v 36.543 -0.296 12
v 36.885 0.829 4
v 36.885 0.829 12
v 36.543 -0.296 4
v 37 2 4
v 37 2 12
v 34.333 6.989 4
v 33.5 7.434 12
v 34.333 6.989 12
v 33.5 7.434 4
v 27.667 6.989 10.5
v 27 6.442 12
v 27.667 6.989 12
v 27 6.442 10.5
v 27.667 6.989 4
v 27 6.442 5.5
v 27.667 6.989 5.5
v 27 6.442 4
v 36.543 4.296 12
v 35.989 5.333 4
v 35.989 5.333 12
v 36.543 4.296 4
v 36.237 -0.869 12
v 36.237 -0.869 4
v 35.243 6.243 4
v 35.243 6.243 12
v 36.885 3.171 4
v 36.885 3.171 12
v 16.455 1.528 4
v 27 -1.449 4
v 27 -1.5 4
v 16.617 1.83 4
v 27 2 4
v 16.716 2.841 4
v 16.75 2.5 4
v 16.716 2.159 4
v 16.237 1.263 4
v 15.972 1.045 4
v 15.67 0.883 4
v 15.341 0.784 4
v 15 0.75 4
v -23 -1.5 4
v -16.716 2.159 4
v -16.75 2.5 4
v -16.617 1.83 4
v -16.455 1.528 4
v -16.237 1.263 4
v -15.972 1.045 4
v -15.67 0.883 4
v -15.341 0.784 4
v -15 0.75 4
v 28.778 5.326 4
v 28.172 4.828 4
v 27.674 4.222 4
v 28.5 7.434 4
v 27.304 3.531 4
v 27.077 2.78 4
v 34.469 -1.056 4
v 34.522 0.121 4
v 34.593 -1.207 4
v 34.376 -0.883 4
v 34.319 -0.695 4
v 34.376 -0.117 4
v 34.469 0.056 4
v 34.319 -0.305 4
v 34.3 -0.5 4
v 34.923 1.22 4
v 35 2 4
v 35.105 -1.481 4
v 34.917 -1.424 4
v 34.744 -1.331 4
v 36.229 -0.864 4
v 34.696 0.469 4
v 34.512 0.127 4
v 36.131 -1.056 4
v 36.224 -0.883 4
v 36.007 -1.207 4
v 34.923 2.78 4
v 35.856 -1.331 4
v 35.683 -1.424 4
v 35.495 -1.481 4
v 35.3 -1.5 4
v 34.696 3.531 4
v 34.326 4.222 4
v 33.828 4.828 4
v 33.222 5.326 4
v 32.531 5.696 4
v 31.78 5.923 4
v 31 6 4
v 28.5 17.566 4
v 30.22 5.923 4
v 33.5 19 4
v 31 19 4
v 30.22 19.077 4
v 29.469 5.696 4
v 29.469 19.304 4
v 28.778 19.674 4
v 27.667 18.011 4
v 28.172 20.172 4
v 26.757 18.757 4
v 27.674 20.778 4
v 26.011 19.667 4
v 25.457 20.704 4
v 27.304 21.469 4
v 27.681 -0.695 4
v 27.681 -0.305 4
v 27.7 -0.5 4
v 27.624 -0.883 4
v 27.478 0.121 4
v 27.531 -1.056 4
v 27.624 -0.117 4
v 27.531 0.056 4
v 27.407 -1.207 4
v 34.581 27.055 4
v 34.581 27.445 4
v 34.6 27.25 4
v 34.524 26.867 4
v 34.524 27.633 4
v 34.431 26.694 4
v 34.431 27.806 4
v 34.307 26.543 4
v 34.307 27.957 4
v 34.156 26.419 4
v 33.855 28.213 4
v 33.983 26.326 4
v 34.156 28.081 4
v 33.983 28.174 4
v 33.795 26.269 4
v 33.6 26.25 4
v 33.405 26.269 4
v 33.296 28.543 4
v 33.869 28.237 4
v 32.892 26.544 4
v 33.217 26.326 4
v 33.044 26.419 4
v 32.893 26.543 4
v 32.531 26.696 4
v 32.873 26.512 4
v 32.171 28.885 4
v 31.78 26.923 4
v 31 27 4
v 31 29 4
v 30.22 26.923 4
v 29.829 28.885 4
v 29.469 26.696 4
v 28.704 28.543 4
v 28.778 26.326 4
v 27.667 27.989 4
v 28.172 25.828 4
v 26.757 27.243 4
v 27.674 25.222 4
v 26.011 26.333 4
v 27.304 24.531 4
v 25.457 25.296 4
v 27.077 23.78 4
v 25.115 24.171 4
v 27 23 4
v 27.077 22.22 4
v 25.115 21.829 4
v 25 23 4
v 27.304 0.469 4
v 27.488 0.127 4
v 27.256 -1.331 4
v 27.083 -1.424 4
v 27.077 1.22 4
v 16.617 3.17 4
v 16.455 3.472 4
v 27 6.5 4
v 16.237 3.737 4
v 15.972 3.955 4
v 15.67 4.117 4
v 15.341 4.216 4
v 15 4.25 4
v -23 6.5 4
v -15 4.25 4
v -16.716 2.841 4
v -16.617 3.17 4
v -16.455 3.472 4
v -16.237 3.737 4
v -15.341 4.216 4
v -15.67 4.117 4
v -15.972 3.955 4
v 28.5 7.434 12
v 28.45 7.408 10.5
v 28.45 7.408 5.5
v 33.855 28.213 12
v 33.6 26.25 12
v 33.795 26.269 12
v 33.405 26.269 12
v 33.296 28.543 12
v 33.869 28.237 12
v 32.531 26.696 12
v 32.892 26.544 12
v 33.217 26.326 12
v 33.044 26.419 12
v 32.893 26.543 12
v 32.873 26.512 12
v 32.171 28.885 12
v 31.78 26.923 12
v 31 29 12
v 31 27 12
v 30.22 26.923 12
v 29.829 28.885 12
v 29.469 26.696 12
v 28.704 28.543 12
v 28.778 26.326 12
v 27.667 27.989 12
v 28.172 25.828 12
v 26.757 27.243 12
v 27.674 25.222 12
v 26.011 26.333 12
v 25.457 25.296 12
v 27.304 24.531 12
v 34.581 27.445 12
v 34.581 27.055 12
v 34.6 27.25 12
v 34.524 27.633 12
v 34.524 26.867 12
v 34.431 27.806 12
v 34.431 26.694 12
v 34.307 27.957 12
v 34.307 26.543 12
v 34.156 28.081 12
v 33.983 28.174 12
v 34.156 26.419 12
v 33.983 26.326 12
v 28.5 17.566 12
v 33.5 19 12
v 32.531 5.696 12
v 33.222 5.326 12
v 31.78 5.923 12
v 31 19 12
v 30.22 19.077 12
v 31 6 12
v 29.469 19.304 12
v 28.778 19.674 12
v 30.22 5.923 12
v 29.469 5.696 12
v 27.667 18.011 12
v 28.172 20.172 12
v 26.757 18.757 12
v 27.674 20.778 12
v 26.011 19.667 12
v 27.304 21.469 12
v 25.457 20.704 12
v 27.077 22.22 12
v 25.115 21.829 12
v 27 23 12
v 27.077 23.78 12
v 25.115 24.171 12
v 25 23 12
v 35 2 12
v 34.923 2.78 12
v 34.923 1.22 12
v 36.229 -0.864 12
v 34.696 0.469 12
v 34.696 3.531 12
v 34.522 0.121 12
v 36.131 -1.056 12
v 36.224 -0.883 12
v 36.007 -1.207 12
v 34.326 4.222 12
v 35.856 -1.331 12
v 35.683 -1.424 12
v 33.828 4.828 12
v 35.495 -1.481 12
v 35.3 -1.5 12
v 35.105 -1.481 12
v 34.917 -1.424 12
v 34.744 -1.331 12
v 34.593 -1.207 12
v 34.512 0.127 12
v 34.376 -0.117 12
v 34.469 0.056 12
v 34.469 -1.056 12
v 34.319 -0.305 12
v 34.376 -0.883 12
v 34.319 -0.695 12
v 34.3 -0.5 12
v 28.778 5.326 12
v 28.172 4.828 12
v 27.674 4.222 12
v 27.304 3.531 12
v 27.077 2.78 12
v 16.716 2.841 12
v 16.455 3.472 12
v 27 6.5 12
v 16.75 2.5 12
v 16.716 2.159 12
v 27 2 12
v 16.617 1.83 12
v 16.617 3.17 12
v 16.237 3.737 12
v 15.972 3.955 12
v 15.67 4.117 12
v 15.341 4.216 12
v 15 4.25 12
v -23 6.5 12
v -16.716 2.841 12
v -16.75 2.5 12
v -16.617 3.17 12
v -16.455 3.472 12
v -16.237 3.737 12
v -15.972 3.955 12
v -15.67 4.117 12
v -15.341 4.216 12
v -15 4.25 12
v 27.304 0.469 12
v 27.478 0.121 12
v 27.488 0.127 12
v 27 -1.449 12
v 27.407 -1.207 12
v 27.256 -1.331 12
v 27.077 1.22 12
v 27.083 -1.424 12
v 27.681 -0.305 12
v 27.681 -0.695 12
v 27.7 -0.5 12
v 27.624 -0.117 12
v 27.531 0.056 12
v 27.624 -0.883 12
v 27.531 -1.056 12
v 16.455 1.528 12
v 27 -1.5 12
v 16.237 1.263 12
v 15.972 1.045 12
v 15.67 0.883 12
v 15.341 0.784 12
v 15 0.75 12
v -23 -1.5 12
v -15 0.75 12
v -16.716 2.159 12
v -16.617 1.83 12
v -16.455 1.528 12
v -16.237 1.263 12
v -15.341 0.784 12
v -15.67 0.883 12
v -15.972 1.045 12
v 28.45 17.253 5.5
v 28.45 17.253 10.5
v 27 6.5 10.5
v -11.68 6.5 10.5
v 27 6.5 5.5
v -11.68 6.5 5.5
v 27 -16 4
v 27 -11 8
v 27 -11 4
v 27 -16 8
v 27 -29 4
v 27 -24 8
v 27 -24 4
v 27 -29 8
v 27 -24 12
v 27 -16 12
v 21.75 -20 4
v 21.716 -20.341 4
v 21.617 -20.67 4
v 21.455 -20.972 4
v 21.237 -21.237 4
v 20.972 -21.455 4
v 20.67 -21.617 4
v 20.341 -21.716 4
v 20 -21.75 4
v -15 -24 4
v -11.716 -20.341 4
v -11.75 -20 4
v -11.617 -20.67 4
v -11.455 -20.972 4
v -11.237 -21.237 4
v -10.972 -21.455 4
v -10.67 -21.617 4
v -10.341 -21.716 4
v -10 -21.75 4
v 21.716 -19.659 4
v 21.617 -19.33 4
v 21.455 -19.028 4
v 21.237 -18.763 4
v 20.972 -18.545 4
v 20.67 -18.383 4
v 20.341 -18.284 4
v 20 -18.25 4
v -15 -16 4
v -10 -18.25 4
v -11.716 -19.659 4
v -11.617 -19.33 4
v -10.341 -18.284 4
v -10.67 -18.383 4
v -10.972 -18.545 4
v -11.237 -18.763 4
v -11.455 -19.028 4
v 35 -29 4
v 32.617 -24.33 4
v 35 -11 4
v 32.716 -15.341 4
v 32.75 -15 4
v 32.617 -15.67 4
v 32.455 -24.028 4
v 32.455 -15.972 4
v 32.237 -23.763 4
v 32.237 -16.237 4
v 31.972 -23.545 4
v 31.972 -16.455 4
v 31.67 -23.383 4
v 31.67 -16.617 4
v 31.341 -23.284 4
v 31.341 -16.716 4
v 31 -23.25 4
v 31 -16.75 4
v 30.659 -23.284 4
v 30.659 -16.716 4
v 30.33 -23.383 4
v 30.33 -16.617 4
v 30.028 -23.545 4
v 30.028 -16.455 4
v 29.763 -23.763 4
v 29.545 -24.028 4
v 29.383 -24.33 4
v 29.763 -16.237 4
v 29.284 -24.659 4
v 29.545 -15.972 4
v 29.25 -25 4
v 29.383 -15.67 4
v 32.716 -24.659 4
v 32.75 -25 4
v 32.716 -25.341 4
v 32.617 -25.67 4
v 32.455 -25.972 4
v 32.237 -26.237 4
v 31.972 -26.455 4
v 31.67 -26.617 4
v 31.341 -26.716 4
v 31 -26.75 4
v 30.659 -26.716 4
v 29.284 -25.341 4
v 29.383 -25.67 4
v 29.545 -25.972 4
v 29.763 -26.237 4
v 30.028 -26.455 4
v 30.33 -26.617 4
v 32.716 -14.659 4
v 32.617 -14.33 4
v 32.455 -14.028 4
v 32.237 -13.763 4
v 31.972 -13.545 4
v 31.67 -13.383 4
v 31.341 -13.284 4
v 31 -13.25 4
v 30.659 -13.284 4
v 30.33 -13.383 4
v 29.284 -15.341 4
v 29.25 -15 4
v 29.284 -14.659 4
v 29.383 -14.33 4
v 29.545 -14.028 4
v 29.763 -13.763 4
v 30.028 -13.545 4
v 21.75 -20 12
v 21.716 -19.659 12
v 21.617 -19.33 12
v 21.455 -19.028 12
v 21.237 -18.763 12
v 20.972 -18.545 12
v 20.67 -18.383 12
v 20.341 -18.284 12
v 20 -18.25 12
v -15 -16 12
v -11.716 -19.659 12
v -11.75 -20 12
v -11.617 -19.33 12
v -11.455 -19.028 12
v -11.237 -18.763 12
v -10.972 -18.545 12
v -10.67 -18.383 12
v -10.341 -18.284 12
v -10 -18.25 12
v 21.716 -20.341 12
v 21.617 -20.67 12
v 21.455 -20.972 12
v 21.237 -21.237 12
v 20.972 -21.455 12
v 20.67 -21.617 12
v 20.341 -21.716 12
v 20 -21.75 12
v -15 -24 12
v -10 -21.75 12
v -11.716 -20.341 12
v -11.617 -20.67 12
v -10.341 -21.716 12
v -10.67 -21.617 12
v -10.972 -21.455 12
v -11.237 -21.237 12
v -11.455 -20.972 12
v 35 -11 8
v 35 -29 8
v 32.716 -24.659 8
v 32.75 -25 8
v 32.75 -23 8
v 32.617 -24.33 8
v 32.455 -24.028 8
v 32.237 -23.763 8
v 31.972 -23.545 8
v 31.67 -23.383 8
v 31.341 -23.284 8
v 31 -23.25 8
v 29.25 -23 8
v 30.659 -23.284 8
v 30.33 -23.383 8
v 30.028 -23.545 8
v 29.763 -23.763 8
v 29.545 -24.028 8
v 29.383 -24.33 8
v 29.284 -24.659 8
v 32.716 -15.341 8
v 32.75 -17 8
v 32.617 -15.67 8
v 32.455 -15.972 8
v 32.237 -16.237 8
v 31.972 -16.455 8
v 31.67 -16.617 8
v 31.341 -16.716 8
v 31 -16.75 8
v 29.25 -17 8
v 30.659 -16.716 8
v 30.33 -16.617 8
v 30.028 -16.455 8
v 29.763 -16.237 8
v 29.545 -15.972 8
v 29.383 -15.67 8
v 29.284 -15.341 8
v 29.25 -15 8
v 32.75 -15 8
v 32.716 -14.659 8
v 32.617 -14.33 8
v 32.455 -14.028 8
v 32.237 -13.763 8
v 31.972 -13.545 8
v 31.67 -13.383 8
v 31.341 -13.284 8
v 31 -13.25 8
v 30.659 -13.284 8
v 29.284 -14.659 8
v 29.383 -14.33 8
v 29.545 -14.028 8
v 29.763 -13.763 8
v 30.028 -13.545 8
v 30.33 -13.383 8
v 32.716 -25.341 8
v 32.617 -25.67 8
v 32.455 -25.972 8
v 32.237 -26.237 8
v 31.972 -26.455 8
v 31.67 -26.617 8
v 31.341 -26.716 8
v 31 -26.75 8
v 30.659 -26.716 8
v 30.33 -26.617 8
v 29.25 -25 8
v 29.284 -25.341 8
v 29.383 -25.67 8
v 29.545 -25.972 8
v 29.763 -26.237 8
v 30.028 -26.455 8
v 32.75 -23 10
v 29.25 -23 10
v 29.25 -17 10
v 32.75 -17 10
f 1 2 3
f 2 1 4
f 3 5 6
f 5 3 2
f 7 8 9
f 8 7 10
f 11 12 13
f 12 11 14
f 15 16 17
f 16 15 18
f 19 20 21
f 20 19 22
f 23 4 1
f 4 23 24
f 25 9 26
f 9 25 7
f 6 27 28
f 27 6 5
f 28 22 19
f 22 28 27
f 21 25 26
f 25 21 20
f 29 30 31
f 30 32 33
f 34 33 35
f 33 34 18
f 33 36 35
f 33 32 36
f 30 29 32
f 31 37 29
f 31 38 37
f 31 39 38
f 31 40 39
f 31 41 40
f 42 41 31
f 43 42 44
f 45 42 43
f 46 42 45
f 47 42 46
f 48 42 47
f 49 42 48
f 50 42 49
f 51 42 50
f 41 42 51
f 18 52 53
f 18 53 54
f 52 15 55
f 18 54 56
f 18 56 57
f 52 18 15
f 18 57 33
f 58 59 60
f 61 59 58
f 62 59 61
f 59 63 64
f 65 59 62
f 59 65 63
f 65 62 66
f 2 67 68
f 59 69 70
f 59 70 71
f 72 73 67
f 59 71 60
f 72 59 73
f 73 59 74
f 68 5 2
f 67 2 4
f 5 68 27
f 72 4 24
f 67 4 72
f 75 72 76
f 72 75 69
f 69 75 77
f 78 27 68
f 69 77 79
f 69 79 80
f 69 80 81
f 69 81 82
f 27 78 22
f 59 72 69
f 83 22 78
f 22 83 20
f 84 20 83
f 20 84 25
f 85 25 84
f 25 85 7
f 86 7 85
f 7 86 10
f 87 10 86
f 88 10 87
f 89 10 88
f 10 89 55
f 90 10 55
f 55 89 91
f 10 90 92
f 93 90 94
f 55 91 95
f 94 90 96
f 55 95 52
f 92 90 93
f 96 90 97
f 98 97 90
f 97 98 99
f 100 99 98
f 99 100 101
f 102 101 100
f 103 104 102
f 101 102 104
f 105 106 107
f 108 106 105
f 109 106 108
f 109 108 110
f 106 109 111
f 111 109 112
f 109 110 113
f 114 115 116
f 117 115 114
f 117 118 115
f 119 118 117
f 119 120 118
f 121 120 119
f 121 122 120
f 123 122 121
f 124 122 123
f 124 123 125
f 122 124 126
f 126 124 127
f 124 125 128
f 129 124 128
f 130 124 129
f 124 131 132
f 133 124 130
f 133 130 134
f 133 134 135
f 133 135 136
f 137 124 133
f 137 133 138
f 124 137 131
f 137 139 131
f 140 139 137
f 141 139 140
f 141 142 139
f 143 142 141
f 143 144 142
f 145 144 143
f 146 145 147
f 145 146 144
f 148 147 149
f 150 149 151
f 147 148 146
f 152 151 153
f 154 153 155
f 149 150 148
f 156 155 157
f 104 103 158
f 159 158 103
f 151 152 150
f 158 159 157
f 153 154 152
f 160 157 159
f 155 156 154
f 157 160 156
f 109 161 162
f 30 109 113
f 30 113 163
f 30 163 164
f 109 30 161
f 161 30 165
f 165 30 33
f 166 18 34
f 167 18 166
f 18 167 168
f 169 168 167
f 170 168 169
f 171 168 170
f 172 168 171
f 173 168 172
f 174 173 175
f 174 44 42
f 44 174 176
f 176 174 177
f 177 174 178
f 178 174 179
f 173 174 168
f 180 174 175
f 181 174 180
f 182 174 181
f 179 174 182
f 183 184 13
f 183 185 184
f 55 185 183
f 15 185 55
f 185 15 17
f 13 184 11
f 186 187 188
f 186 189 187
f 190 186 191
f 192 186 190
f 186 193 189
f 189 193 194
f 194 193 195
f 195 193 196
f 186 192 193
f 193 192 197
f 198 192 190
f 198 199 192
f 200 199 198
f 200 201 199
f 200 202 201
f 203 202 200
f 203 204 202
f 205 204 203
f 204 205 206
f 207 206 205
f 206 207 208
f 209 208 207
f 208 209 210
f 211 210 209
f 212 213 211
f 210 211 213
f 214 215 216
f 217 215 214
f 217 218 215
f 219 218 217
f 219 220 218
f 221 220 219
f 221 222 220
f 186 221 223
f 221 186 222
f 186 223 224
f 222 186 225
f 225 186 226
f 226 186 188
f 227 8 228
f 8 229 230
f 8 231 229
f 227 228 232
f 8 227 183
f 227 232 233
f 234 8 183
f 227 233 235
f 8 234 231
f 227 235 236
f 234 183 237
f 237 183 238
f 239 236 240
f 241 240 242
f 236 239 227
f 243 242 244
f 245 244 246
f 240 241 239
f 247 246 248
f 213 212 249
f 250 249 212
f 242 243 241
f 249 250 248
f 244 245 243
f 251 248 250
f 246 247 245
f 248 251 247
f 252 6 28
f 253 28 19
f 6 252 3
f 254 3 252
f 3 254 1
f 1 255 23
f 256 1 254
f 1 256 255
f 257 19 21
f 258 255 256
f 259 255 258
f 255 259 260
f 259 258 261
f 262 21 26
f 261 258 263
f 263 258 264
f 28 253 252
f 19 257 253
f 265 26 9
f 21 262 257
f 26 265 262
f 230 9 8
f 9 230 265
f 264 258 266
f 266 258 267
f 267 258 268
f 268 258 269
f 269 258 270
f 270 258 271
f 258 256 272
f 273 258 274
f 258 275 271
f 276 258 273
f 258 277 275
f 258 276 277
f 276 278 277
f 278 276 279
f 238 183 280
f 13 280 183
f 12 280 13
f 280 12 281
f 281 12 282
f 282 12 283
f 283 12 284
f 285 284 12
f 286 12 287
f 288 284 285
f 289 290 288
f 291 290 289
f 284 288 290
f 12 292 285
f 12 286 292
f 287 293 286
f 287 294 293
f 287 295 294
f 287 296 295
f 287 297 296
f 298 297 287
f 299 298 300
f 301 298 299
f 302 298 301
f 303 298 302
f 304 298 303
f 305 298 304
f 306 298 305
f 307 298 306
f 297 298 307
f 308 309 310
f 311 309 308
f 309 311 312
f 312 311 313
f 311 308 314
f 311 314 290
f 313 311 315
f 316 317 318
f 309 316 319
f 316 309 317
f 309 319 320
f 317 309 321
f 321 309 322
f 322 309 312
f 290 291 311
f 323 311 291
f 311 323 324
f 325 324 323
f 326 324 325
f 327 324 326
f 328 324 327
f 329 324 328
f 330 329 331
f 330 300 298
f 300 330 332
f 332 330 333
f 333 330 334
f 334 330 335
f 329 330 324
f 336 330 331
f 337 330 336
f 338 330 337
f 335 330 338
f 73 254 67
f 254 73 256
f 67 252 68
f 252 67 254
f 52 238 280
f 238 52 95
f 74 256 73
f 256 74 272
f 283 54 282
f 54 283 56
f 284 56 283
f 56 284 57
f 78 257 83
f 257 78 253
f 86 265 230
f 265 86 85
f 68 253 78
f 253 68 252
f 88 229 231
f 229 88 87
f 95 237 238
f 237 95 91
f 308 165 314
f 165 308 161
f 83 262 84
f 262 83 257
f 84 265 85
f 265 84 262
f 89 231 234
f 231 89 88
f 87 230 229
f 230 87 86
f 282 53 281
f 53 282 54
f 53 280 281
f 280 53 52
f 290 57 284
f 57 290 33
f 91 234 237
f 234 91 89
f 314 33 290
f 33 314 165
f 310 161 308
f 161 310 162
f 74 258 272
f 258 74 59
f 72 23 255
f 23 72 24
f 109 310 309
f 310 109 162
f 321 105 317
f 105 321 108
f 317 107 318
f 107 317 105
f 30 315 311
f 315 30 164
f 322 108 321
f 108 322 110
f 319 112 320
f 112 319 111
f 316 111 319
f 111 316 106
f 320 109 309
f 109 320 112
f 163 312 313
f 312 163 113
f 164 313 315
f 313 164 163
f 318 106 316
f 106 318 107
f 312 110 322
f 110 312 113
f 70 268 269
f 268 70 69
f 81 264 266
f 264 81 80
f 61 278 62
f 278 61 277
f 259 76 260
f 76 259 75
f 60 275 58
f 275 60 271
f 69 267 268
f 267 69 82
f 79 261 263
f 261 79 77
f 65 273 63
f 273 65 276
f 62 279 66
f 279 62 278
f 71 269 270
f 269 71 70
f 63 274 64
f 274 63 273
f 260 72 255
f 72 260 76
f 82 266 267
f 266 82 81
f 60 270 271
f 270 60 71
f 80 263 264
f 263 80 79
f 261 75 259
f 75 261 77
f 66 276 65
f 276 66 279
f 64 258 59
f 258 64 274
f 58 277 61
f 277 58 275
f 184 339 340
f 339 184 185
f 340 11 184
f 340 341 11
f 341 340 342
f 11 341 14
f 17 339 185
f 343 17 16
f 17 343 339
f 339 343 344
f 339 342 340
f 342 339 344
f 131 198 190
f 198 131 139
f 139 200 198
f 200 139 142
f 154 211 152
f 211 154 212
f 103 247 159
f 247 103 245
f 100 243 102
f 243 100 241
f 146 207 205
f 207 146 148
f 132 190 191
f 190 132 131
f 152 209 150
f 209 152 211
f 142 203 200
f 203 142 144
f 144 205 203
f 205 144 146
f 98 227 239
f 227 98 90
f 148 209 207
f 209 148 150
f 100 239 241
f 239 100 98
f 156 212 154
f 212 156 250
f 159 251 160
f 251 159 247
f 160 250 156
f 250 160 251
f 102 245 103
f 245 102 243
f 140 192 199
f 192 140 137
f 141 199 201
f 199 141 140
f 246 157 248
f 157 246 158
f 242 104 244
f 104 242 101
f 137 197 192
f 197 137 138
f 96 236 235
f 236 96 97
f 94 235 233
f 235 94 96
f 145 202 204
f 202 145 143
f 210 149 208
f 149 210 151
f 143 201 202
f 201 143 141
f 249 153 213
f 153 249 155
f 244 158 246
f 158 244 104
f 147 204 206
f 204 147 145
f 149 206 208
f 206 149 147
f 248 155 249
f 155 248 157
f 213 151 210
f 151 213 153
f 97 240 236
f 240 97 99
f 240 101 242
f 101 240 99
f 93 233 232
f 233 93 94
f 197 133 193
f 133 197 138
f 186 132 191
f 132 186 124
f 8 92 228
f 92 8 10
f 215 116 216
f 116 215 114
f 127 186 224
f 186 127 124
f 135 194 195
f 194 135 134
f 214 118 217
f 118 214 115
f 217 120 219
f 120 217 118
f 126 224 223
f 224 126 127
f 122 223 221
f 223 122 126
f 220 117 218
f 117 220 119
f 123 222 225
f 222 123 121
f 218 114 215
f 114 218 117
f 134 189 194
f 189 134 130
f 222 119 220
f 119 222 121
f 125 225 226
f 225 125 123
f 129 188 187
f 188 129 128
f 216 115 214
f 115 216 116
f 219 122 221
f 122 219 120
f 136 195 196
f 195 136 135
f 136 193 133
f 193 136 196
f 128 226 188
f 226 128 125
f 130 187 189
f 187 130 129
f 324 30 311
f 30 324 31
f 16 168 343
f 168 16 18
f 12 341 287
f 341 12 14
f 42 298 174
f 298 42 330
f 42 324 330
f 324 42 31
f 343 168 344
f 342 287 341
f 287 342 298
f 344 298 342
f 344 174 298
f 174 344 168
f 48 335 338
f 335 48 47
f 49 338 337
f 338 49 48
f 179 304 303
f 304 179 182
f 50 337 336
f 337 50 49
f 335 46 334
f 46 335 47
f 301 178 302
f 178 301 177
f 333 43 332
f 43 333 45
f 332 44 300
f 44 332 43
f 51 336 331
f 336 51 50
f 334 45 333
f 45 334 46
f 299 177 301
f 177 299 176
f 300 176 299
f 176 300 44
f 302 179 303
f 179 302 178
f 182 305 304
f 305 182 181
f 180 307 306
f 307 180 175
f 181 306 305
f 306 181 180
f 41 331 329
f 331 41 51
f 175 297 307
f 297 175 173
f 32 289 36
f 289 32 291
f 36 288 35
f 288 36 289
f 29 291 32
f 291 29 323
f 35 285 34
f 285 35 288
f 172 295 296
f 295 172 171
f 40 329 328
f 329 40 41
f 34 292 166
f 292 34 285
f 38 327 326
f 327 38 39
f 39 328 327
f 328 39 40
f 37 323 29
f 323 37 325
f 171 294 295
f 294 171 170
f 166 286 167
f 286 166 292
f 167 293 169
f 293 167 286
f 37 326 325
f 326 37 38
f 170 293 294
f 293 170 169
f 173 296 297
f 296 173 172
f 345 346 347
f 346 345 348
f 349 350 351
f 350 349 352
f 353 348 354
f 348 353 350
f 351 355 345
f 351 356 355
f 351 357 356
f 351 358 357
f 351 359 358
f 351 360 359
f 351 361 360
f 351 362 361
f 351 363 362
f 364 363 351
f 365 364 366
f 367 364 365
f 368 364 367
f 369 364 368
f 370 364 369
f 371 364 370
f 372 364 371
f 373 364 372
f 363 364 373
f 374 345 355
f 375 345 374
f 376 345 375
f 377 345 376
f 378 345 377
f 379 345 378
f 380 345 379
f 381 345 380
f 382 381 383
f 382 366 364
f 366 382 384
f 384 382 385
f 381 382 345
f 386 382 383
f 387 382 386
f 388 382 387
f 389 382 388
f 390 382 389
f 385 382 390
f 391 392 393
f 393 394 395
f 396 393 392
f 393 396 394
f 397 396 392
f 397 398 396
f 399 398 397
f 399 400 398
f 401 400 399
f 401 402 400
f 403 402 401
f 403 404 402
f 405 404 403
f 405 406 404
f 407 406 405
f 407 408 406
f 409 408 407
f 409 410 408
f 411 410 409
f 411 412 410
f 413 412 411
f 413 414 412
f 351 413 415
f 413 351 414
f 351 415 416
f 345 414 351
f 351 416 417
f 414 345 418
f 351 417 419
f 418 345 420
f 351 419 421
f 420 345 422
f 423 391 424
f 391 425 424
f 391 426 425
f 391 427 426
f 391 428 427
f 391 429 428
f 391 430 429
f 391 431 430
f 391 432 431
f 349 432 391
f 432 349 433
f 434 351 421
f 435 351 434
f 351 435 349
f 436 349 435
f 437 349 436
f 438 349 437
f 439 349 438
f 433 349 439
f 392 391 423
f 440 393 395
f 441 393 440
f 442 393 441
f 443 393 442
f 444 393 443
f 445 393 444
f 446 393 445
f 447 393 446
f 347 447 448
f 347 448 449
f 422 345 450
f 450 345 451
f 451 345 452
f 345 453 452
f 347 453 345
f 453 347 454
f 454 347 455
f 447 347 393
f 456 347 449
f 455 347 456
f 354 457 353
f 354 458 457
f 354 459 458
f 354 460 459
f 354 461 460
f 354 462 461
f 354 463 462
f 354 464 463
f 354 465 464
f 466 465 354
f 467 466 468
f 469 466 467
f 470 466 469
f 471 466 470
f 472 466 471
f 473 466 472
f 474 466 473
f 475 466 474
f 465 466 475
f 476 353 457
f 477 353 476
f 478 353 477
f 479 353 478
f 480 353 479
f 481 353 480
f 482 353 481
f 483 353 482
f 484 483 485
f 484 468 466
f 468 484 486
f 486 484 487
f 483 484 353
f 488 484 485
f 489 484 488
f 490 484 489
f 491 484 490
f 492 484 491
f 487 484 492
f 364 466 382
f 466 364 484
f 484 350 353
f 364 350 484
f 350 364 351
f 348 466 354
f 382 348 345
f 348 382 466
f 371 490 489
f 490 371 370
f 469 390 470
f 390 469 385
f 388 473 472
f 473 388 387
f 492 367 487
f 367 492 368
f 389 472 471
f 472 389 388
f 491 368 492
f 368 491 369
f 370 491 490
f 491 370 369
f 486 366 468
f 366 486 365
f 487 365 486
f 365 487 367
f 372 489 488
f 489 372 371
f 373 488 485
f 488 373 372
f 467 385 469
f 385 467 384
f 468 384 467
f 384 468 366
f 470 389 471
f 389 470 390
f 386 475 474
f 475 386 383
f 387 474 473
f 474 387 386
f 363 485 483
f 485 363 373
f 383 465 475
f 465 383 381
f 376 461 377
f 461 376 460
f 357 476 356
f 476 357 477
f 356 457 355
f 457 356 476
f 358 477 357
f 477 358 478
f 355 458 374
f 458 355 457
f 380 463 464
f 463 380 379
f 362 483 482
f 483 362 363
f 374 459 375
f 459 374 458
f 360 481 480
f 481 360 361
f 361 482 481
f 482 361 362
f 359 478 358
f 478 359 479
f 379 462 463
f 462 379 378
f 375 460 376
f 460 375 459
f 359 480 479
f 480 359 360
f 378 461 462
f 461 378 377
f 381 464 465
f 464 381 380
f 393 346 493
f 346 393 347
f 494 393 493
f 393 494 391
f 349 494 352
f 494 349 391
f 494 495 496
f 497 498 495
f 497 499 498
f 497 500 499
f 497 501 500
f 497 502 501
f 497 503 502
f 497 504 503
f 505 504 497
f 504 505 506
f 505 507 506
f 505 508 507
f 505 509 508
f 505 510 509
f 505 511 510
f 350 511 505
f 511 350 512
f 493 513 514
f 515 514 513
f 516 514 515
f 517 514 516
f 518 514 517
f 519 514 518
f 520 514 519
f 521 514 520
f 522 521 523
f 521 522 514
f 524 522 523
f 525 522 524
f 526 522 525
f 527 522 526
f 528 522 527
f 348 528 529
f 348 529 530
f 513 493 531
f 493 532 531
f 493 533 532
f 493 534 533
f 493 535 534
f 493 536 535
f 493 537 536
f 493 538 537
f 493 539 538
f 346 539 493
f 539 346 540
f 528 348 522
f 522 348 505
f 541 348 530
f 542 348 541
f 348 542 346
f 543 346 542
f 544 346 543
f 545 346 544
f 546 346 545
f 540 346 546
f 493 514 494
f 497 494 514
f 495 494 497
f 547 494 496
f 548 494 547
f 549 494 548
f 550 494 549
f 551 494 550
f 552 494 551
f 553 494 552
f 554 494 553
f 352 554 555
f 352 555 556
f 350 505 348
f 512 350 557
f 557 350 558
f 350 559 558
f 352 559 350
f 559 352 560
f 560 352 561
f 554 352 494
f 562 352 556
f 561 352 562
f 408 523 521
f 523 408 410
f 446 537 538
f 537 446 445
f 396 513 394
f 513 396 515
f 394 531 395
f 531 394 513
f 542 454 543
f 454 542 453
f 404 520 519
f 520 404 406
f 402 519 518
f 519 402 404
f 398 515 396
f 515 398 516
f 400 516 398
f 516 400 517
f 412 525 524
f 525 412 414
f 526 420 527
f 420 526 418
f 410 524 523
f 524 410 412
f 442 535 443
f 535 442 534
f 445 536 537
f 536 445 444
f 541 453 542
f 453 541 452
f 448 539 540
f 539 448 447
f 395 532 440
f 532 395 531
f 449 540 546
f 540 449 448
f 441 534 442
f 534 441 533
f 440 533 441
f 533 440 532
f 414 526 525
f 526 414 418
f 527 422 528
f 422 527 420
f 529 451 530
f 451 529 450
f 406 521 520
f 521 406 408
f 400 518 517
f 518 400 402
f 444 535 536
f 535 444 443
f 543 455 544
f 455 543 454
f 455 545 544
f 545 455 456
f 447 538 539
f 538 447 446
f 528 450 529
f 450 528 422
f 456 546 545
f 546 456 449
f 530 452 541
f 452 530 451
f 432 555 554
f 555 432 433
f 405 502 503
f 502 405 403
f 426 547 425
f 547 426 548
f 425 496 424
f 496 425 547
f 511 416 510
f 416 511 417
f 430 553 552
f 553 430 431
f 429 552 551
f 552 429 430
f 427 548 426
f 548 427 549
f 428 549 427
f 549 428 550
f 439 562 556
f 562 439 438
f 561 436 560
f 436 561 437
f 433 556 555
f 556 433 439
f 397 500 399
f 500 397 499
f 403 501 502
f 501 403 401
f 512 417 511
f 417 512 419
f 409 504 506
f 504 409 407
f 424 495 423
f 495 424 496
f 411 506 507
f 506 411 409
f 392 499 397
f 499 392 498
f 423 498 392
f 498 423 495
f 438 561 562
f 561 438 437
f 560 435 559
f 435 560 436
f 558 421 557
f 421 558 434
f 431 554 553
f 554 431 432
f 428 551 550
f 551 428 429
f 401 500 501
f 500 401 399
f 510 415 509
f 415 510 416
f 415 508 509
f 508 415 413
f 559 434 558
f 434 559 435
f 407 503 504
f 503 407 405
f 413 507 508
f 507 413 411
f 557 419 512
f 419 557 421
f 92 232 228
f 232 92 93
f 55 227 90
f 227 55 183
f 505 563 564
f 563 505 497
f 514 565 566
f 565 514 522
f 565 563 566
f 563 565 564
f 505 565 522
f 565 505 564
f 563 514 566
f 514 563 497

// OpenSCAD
$fn = 32;
rotate([90,0,0]) union() {


//The top m8 threaded rod connection
union() {
difference() {

translate([31,12,-2]) rotate([90,0,0]) cylinder(8,6,6);

translate([31,13,-2]) rotate([90,0,0]) cylinder(20,4,4);

translate([33,13,-1]) rotate([90,-30,0]) cube([6,6,20]);

translate([29,-7,-1]) rotate([90,-30,180]) cube([6,6,20]);

translate([33,0,0]) rotate([90,-30,180]) cube([6,6,20]);

translate([28,13,0]) rotate([90,0,0]) cube([6,6,20]);
	    }

translate([26.7,12,.5]) rotate([90,0,0]) cylinder(8,1,1);

translate([35.3,12,.5]) rotate([90,0,0]) cylinder(8,1,1);

	    }

//Connection between two M8 connections
translate([28.5,4,-19]) rotate([0,0,0]) cube([5,8,12]);

//brace
difference() {
translate([-21.55,5.5,-18.5]) rotate([0,0,0]) cube([50,5,13]);
translate([-53.5,4.5,-16]) rotate([0,15,0]) cube([80,10,20]);
	    }


//Lower M8 threaded rod connection
translate([33,0,8]) rotate([0,90,0]) union() 
{
difference() {
translate([31,12,-2]) rotate([90,0,0]) cylinder(8,6,6);

translate([31,13,-2]) rotate([90,0,0]) cylinder(20,4,4);;

translate([33,13,-1]) rotate([90,-30,0]) cube([6,6,20]);

translate([29,-7,.5]) rotate([90,0,180]) cube([6,6,20]);

translate([33,0,0]) rotate([90,-30,180]) cube([6,6,20]);

translate([26,13,-2]) rotate([90,0,0]) cube([6,10,20]);
	    }

translate([35.25,12,.6]) rotate([90,0,0]) cylinder(8,1,1);

	    }




//Horizontal frame mount
translate([-8,12,-2.5]) rotate ([90,0,0]) difference() {

translate([-15,-4,0]) rotate([0,0,0]) cube([50, 8, 8]);

translate([-7,0,-2]) rotate([0,0,0]) cylinder(10,1.75,1.75);

translate([-7,-1.75,-2]) rotate([0,0,0]) cube([30, 3.5, 10]);

translate([23,0,-2]) rotate([0,0,0]) cylinder(10,1.75,1.75);
	    }


//Vertical Frame Mount
translate([-10,12,20]) rotate([90,0,0]) difference() {

translate([-5,-4,0]) rotate([0,0,0]) cube([42, 8, 8]);

translate([0,0,-2]) rotate([0,0,0]) cylinder(10,1.75,1.75);

translate([0,-1.75,-2]) rotate([0,0,0]) cube([30, 3.5, 10]);

translate([30,0,-2]) rotate([0,0,0]) cylinder(10,1.75,1.75);
	    }

translate([0,0,2]) rotate([0,0,0]) difference() {
translate([27,4,27]) rotate([0,90,0]) cube([18, 4, 8]);
translate([31,12,13]) rotate([90,0,0]) cylinder(10,1.75,1.75);

translate([31,12,23]) rotate([90,0,0]) cylinder(10,1.75,1.75);
	    }
translate([29.25,10,23]) rotate([90,90,0]) cube([6, 3.5, 5]);

translate([24.5,4,23]) rotate([0,90,0]) cube([6, 3.5, 5]);

	    }
